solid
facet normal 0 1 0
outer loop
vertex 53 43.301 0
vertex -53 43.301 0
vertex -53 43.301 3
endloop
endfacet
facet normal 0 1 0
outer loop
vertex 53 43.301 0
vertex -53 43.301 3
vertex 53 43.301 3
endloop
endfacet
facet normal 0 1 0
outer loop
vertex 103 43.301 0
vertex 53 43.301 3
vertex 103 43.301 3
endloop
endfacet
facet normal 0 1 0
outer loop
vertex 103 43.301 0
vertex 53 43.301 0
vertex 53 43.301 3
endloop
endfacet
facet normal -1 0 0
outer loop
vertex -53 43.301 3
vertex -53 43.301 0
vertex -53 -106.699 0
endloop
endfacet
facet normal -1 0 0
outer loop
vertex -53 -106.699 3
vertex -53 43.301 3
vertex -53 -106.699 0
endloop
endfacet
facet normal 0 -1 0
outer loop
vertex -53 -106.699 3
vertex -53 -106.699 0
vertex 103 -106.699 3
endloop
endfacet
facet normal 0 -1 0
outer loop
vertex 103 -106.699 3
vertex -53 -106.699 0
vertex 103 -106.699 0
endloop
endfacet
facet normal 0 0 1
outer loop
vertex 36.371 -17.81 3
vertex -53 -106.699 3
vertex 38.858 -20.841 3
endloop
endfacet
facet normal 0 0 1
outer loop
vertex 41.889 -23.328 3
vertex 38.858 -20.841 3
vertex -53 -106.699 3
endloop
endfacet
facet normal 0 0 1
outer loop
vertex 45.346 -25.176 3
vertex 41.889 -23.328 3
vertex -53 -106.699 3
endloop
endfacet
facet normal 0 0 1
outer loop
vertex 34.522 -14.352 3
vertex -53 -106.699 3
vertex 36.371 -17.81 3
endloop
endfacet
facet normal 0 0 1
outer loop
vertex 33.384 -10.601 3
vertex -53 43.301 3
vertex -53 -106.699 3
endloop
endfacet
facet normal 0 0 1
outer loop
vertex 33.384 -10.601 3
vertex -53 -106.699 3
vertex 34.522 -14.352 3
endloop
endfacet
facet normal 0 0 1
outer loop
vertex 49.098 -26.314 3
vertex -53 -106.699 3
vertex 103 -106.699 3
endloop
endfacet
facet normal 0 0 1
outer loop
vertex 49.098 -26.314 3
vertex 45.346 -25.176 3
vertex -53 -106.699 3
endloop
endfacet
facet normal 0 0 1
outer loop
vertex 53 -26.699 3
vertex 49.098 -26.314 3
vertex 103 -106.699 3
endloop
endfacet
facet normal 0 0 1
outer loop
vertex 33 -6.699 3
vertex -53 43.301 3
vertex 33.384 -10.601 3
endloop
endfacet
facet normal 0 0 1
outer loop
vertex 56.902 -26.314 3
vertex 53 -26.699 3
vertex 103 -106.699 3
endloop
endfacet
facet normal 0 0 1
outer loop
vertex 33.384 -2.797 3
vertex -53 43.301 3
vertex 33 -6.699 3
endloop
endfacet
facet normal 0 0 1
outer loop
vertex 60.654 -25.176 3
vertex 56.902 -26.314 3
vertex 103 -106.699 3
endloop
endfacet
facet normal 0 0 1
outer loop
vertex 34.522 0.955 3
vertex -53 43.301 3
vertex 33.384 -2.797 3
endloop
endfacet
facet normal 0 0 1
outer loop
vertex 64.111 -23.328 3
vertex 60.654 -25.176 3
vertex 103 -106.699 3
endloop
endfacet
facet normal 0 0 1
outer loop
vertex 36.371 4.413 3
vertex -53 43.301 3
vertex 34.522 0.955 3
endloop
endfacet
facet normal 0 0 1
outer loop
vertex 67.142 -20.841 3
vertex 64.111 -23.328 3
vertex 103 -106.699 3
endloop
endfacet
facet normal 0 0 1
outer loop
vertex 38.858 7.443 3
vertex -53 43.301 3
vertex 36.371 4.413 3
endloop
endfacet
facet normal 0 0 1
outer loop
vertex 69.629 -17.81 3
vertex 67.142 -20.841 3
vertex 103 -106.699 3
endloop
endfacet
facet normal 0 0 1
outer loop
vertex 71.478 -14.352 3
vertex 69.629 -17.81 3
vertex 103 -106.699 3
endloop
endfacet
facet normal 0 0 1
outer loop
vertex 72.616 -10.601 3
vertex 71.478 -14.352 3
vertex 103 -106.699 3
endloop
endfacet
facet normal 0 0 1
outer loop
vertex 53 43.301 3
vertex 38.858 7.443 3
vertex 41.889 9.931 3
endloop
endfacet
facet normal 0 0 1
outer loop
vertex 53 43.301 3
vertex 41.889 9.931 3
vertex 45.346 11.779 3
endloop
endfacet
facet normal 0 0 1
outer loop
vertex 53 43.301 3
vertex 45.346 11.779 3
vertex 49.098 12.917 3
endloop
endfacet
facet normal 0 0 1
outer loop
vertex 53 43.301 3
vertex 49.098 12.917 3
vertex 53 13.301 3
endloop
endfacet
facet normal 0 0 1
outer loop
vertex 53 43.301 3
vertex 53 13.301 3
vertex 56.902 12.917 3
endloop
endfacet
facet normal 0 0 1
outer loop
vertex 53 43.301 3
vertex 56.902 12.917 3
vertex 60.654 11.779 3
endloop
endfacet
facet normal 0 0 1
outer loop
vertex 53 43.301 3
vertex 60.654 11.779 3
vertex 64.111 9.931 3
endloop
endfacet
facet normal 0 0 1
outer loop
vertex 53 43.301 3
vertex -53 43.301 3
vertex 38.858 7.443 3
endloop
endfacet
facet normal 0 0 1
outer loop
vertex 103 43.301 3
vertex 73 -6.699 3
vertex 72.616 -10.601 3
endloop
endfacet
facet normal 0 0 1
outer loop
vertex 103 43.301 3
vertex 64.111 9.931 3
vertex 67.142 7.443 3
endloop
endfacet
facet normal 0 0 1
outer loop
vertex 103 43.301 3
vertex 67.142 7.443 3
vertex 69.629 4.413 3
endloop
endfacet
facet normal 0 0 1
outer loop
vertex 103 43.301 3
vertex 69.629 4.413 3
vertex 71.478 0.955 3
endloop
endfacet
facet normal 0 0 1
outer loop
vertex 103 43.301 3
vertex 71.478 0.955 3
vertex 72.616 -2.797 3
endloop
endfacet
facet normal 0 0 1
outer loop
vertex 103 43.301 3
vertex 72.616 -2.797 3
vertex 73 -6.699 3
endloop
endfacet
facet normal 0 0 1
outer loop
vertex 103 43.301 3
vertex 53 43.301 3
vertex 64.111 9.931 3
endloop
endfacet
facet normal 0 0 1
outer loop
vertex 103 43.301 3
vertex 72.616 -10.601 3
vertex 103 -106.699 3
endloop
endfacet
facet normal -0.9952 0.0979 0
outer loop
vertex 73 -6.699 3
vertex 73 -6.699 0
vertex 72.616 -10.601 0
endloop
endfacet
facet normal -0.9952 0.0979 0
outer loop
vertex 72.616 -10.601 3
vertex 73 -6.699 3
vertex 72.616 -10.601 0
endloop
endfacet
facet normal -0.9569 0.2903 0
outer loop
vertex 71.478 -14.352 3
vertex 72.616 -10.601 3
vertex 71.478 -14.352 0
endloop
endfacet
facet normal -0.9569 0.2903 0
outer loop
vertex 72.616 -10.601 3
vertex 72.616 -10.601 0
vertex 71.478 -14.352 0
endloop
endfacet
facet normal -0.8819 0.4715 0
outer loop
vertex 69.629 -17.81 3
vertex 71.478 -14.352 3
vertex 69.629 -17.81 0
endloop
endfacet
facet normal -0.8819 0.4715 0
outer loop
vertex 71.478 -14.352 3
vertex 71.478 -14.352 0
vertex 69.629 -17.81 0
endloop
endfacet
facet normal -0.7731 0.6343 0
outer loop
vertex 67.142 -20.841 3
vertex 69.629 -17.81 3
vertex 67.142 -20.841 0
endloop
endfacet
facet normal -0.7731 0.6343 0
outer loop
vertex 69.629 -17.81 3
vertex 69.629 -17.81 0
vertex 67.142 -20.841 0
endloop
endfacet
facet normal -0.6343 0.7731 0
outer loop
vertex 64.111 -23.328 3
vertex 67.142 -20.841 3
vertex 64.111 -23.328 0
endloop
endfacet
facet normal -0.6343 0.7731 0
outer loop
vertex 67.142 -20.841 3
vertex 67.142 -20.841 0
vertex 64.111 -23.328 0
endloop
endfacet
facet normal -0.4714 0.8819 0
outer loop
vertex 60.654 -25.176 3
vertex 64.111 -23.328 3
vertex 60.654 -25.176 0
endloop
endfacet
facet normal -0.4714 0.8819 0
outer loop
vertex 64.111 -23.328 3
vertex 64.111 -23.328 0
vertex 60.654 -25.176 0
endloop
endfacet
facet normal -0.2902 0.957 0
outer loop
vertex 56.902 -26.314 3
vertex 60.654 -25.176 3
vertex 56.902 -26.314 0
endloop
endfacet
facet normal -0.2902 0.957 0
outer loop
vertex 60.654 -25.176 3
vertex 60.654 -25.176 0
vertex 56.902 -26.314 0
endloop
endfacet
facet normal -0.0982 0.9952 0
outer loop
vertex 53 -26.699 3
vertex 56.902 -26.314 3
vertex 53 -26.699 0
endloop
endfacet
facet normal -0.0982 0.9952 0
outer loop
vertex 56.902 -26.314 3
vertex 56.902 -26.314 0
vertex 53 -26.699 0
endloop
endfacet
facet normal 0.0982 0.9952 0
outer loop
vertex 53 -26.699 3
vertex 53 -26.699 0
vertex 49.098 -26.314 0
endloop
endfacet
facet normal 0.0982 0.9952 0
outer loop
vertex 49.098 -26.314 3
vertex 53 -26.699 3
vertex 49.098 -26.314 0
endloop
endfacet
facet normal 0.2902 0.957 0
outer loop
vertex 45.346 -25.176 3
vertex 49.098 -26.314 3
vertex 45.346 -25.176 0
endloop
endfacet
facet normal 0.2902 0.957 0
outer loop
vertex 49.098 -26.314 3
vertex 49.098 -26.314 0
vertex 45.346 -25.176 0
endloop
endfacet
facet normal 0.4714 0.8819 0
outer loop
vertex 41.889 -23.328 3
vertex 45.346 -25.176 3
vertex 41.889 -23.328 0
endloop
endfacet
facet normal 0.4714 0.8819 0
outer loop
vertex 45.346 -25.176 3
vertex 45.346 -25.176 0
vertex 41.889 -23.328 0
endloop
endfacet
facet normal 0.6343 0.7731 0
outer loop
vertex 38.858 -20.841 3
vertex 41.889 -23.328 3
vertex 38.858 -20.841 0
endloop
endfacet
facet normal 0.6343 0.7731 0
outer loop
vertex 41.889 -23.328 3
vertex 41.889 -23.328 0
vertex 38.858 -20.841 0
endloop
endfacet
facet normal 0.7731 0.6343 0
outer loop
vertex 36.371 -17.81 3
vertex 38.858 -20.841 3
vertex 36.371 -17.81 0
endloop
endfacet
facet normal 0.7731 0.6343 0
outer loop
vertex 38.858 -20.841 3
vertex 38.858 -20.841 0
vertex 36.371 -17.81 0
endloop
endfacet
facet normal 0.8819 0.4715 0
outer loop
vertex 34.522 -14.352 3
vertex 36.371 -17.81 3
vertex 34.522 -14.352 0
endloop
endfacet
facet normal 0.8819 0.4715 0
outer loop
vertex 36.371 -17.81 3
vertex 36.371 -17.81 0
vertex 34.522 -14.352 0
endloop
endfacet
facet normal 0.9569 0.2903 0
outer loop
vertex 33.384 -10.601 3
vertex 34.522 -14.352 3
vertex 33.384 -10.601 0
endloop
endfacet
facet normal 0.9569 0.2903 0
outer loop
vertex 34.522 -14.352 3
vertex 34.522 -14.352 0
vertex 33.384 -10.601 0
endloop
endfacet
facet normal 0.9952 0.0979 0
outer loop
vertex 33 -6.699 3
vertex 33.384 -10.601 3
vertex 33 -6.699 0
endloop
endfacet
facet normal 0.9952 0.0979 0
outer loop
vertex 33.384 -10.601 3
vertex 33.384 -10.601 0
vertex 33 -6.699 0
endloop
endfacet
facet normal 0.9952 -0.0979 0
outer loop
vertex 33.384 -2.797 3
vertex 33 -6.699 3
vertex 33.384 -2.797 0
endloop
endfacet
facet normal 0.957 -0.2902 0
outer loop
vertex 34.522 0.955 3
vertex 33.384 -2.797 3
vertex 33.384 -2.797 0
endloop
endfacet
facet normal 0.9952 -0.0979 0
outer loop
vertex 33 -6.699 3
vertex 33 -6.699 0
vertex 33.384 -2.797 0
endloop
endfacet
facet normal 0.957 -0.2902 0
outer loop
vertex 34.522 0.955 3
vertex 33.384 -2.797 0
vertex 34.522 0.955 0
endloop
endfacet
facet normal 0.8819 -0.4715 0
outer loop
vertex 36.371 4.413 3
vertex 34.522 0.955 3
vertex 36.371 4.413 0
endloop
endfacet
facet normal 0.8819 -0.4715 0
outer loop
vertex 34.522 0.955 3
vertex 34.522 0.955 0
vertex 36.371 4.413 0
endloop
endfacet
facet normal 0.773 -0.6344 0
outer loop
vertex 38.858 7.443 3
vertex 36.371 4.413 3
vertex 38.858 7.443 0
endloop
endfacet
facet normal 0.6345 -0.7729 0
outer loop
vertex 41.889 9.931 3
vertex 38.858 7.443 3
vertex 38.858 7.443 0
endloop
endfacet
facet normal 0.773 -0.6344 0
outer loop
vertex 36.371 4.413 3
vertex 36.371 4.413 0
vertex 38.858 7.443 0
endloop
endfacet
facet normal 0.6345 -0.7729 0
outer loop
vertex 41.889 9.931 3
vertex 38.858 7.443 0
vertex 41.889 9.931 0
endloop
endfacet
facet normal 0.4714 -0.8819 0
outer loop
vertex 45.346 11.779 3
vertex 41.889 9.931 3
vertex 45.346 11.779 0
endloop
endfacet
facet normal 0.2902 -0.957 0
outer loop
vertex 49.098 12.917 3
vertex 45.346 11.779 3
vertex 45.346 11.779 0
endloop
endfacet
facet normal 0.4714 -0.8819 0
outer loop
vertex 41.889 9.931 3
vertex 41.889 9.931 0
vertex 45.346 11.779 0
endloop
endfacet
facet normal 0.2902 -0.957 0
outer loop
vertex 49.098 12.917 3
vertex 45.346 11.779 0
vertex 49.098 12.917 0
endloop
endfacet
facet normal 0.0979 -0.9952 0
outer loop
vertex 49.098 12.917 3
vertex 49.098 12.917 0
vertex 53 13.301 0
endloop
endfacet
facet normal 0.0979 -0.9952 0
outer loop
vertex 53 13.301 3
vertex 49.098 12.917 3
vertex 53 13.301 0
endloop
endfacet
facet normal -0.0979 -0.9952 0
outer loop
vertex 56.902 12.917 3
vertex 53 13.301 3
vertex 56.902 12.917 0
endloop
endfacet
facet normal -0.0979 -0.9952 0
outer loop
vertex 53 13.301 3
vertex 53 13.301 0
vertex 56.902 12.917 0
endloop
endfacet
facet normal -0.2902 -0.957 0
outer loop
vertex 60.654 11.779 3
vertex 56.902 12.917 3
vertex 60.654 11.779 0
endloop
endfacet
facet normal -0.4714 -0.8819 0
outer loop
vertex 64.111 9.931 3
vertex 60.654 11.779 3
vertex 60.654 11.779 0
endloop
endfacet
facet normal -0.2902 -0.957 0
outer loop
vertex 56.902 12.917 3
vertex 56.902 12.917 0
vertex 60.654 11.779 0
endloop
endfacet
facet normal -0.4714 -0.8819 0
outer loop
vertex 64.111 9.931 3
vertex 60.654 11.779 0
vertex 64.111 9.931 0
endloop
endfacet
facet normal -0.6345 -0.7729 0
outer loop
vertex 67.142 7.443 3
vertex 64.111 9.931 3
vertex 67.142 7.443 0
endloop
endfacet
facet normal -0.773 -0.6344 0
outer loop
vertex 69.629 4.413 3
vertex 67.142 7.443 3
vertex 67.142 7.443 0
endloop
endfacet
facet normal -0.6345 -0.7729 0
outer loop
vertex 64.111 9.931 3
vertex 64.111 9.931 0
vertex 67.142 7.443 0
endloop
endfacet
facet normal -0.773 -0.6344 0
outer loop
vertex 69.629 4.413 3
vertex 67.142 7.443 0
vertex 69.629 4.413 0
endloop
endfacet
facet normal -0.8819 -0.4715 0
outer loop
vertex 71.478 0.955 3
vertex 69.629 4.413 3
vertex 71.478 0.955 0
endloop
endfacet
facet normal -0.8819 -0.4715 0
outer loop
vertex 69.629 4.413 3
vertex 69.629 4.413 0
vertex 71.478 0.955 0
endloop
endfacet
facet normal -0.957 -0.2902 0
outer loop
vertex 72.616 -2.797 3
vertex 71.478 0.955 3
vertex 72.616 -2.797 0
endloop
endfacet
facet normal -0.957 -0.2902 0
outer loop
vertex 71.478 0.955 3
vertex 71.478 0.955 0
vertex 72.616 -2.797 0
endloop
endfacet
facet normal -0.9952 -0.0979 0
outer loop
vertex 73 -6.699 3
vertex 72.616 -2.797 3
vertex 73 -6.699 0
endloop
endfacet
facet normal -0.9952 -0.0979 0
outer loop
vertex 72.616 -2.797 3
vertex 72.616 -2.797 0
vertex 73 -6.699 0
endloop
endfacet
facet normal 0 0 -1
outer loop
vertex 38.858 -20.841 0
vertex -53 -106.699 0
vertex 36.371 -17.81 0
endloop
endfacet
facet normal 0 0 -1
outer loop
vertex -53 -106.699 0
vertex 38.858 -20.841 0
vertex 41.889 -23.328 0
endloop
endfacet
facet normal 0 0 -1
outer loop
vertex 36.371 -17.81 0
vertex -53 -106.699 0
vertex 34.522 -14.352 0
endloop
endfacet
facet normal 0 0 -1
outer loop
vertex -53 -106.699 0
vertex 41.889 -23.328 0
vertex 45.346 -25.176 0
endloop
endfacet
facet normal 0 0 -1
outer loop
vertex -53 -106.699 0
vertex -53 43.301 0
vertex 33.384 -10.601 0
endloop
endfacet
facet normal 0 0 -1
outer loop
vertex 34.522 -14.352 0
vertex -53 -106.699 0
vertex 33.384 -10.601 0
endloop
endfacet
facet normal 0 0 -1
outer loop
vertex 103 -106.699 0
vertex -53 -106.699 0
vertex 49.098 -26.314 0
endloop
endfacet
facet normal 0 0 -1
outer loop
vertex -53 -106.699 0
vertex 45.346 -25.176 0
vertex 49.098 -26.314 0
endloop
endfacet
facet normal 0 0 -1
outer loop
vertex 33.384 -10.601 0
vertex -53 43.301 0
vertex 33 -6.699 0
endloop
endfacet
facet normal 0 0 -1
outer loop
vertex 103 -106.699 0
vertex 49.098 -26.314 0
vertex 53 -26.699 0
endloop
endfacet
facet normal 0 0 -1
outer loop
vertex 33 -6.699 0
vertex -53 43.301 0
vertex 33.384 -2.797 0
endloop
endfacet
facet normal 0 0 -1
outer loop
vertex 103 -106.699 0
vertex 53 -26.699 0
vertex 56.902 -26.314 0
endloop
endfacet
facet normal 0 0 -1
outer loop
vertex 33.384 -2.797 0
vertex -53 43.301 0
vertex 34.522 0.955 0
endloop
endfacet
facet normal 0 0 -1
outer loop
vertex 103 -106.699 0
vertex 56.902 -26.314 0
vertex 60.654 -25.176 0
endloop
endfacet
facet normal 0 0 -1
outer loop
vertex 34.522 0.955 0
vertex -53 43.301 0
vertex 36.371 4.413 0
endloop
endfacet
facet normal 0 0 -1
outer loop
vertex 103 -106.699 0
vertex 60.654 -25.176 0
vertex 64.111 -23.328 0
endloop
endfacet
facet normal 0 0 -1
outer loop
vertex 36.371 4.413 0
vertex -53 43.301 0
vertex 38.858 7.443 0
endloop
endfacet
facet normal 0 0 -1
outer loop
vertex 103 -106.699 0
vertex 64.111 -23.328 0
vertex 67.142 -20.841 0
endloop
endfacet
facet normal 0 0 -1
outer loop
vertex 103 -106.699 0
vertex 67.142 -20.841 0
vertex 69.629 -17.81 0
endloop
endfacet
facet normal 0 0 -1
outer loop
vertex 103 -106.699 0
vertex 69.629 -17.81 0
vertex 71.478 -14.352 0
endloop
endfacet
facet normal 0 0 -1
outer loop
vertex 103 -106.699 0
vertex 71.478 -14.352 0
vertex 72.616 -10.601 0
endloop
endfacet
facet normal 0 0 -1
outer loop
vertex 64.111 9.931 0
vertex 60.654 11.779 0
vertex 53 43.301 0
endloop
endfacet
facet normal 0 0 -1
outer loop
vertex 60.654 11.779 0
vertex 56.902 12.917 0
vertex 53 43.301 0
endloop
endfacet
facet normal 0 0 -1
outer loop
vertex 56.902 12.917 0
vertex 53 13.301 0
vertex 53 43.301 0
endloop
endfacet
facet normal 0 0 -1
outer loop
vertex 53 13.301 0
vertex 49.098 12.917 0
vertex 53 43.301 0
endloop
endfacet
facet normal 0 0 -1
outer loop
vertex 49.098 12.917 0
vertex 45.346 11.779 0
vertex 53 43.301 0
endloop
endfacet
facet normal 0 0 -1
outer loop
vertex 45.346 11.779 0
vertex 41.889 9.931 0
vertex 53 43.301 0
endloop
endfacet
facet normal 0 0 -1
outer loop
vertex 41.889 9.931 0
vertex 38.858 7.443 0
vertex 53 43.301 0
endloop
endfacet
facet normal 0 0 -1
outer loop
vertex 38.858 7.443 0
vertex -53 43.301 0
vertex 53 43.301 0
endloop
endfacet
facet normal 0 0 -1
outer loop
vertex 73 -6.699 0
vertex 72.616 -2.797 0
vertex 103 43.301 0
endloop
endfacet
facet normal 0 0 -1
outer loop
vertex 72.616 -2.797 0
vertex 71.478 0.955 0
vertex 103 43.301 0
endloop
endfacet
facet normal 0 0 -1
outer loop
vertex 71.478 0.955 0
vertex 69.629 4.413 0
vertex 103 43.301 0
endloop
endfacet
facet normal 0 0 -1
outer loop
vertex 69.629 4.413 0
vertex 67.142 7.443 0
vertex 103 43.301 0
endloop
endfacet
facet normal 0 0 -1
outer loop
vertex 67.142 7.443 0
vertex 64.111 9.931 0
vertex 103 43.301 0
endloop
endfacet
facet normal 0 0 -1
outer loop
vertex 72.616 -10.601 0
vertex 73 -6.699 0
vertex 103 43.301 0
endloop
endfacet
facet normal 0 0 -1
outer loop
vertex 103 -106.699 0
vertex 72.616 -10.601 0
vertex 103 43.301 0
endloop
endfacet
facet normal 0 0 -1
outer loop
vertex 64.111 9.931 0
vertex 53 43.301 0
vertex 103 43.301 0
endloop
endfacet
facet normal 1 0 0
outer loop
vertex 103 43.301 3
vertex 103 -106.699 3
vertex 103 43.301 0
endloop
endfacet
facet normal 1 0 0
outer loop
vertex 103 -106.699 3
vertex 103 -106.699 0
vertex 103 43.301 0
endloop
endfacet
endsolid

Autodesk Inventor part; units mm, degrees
ref_plane "YZ Plane" through (0, 0, 0) normal (1, 0, 0) x (0, 1, 0)
ref_plane "XZ Plane" through (0, 0, 0) normal (0, 1, 0) x (-1, 0, 0)
ref_plane "XY Plane" through (0, 0, 0) normal (0, 0, 1) x (1, 0, 0)
sketch "Sketch1" plane through (0, 0, 0) normal (0, 0, 1) x (1, 0, 0)
  line L0 (-53, 43.3013) -> (103, 43.3013)
  line L1 (-53, 43.3013) -> (-53, -106.6987)
  line L2 (-53, -106.6987) -> (103, -106.6987)
  line L3 (103, -106.6987) -> (103, 43.3013)
  line L4 (0, 0) -> (-53, 0)
  line L5 (0, 0) -> (25, 43.3013)
  line L6 (103, 43.3013) -> (53, 43.3013)
  line L7 (53, 43.3013) -> (53, -6.6987)
  circle A0 centre (53, -6.6987) radius 20
  dimension "d0" = 156
  dimension "d1" = 150
  dimension "d2" = 53
  dimension "d12" = 50
  dimension "d13" = 50
  dimension "d14" = 50
  dimension "d15" = 40
sketch "Sketch2" plane through (0, 0, 0) normal (0, 0, 1) x (1, 0, 0)
  point P0 (0, 0)
extrude "Extrusion1" add sketch "Sketch1" along normal blind 3 contours L0 L5 L4 L1 | A0 | L0 L3 L2 L1 L4 L5
sketch "Sketch3" plane through (103, -106.6987, 0) normal (1, 0, 0) x (0, 0, -1)
  point P0 (0, 106.6987)
sketch "Sketch4" plane through (0, 0, 0) normal (0, 0, 1) x (1, 0, 0)
  point P0 (0, 0)
extrude "Extrusion2" cut sketch "Sketch1" along normal through all contours A0
properties part number "box top"
